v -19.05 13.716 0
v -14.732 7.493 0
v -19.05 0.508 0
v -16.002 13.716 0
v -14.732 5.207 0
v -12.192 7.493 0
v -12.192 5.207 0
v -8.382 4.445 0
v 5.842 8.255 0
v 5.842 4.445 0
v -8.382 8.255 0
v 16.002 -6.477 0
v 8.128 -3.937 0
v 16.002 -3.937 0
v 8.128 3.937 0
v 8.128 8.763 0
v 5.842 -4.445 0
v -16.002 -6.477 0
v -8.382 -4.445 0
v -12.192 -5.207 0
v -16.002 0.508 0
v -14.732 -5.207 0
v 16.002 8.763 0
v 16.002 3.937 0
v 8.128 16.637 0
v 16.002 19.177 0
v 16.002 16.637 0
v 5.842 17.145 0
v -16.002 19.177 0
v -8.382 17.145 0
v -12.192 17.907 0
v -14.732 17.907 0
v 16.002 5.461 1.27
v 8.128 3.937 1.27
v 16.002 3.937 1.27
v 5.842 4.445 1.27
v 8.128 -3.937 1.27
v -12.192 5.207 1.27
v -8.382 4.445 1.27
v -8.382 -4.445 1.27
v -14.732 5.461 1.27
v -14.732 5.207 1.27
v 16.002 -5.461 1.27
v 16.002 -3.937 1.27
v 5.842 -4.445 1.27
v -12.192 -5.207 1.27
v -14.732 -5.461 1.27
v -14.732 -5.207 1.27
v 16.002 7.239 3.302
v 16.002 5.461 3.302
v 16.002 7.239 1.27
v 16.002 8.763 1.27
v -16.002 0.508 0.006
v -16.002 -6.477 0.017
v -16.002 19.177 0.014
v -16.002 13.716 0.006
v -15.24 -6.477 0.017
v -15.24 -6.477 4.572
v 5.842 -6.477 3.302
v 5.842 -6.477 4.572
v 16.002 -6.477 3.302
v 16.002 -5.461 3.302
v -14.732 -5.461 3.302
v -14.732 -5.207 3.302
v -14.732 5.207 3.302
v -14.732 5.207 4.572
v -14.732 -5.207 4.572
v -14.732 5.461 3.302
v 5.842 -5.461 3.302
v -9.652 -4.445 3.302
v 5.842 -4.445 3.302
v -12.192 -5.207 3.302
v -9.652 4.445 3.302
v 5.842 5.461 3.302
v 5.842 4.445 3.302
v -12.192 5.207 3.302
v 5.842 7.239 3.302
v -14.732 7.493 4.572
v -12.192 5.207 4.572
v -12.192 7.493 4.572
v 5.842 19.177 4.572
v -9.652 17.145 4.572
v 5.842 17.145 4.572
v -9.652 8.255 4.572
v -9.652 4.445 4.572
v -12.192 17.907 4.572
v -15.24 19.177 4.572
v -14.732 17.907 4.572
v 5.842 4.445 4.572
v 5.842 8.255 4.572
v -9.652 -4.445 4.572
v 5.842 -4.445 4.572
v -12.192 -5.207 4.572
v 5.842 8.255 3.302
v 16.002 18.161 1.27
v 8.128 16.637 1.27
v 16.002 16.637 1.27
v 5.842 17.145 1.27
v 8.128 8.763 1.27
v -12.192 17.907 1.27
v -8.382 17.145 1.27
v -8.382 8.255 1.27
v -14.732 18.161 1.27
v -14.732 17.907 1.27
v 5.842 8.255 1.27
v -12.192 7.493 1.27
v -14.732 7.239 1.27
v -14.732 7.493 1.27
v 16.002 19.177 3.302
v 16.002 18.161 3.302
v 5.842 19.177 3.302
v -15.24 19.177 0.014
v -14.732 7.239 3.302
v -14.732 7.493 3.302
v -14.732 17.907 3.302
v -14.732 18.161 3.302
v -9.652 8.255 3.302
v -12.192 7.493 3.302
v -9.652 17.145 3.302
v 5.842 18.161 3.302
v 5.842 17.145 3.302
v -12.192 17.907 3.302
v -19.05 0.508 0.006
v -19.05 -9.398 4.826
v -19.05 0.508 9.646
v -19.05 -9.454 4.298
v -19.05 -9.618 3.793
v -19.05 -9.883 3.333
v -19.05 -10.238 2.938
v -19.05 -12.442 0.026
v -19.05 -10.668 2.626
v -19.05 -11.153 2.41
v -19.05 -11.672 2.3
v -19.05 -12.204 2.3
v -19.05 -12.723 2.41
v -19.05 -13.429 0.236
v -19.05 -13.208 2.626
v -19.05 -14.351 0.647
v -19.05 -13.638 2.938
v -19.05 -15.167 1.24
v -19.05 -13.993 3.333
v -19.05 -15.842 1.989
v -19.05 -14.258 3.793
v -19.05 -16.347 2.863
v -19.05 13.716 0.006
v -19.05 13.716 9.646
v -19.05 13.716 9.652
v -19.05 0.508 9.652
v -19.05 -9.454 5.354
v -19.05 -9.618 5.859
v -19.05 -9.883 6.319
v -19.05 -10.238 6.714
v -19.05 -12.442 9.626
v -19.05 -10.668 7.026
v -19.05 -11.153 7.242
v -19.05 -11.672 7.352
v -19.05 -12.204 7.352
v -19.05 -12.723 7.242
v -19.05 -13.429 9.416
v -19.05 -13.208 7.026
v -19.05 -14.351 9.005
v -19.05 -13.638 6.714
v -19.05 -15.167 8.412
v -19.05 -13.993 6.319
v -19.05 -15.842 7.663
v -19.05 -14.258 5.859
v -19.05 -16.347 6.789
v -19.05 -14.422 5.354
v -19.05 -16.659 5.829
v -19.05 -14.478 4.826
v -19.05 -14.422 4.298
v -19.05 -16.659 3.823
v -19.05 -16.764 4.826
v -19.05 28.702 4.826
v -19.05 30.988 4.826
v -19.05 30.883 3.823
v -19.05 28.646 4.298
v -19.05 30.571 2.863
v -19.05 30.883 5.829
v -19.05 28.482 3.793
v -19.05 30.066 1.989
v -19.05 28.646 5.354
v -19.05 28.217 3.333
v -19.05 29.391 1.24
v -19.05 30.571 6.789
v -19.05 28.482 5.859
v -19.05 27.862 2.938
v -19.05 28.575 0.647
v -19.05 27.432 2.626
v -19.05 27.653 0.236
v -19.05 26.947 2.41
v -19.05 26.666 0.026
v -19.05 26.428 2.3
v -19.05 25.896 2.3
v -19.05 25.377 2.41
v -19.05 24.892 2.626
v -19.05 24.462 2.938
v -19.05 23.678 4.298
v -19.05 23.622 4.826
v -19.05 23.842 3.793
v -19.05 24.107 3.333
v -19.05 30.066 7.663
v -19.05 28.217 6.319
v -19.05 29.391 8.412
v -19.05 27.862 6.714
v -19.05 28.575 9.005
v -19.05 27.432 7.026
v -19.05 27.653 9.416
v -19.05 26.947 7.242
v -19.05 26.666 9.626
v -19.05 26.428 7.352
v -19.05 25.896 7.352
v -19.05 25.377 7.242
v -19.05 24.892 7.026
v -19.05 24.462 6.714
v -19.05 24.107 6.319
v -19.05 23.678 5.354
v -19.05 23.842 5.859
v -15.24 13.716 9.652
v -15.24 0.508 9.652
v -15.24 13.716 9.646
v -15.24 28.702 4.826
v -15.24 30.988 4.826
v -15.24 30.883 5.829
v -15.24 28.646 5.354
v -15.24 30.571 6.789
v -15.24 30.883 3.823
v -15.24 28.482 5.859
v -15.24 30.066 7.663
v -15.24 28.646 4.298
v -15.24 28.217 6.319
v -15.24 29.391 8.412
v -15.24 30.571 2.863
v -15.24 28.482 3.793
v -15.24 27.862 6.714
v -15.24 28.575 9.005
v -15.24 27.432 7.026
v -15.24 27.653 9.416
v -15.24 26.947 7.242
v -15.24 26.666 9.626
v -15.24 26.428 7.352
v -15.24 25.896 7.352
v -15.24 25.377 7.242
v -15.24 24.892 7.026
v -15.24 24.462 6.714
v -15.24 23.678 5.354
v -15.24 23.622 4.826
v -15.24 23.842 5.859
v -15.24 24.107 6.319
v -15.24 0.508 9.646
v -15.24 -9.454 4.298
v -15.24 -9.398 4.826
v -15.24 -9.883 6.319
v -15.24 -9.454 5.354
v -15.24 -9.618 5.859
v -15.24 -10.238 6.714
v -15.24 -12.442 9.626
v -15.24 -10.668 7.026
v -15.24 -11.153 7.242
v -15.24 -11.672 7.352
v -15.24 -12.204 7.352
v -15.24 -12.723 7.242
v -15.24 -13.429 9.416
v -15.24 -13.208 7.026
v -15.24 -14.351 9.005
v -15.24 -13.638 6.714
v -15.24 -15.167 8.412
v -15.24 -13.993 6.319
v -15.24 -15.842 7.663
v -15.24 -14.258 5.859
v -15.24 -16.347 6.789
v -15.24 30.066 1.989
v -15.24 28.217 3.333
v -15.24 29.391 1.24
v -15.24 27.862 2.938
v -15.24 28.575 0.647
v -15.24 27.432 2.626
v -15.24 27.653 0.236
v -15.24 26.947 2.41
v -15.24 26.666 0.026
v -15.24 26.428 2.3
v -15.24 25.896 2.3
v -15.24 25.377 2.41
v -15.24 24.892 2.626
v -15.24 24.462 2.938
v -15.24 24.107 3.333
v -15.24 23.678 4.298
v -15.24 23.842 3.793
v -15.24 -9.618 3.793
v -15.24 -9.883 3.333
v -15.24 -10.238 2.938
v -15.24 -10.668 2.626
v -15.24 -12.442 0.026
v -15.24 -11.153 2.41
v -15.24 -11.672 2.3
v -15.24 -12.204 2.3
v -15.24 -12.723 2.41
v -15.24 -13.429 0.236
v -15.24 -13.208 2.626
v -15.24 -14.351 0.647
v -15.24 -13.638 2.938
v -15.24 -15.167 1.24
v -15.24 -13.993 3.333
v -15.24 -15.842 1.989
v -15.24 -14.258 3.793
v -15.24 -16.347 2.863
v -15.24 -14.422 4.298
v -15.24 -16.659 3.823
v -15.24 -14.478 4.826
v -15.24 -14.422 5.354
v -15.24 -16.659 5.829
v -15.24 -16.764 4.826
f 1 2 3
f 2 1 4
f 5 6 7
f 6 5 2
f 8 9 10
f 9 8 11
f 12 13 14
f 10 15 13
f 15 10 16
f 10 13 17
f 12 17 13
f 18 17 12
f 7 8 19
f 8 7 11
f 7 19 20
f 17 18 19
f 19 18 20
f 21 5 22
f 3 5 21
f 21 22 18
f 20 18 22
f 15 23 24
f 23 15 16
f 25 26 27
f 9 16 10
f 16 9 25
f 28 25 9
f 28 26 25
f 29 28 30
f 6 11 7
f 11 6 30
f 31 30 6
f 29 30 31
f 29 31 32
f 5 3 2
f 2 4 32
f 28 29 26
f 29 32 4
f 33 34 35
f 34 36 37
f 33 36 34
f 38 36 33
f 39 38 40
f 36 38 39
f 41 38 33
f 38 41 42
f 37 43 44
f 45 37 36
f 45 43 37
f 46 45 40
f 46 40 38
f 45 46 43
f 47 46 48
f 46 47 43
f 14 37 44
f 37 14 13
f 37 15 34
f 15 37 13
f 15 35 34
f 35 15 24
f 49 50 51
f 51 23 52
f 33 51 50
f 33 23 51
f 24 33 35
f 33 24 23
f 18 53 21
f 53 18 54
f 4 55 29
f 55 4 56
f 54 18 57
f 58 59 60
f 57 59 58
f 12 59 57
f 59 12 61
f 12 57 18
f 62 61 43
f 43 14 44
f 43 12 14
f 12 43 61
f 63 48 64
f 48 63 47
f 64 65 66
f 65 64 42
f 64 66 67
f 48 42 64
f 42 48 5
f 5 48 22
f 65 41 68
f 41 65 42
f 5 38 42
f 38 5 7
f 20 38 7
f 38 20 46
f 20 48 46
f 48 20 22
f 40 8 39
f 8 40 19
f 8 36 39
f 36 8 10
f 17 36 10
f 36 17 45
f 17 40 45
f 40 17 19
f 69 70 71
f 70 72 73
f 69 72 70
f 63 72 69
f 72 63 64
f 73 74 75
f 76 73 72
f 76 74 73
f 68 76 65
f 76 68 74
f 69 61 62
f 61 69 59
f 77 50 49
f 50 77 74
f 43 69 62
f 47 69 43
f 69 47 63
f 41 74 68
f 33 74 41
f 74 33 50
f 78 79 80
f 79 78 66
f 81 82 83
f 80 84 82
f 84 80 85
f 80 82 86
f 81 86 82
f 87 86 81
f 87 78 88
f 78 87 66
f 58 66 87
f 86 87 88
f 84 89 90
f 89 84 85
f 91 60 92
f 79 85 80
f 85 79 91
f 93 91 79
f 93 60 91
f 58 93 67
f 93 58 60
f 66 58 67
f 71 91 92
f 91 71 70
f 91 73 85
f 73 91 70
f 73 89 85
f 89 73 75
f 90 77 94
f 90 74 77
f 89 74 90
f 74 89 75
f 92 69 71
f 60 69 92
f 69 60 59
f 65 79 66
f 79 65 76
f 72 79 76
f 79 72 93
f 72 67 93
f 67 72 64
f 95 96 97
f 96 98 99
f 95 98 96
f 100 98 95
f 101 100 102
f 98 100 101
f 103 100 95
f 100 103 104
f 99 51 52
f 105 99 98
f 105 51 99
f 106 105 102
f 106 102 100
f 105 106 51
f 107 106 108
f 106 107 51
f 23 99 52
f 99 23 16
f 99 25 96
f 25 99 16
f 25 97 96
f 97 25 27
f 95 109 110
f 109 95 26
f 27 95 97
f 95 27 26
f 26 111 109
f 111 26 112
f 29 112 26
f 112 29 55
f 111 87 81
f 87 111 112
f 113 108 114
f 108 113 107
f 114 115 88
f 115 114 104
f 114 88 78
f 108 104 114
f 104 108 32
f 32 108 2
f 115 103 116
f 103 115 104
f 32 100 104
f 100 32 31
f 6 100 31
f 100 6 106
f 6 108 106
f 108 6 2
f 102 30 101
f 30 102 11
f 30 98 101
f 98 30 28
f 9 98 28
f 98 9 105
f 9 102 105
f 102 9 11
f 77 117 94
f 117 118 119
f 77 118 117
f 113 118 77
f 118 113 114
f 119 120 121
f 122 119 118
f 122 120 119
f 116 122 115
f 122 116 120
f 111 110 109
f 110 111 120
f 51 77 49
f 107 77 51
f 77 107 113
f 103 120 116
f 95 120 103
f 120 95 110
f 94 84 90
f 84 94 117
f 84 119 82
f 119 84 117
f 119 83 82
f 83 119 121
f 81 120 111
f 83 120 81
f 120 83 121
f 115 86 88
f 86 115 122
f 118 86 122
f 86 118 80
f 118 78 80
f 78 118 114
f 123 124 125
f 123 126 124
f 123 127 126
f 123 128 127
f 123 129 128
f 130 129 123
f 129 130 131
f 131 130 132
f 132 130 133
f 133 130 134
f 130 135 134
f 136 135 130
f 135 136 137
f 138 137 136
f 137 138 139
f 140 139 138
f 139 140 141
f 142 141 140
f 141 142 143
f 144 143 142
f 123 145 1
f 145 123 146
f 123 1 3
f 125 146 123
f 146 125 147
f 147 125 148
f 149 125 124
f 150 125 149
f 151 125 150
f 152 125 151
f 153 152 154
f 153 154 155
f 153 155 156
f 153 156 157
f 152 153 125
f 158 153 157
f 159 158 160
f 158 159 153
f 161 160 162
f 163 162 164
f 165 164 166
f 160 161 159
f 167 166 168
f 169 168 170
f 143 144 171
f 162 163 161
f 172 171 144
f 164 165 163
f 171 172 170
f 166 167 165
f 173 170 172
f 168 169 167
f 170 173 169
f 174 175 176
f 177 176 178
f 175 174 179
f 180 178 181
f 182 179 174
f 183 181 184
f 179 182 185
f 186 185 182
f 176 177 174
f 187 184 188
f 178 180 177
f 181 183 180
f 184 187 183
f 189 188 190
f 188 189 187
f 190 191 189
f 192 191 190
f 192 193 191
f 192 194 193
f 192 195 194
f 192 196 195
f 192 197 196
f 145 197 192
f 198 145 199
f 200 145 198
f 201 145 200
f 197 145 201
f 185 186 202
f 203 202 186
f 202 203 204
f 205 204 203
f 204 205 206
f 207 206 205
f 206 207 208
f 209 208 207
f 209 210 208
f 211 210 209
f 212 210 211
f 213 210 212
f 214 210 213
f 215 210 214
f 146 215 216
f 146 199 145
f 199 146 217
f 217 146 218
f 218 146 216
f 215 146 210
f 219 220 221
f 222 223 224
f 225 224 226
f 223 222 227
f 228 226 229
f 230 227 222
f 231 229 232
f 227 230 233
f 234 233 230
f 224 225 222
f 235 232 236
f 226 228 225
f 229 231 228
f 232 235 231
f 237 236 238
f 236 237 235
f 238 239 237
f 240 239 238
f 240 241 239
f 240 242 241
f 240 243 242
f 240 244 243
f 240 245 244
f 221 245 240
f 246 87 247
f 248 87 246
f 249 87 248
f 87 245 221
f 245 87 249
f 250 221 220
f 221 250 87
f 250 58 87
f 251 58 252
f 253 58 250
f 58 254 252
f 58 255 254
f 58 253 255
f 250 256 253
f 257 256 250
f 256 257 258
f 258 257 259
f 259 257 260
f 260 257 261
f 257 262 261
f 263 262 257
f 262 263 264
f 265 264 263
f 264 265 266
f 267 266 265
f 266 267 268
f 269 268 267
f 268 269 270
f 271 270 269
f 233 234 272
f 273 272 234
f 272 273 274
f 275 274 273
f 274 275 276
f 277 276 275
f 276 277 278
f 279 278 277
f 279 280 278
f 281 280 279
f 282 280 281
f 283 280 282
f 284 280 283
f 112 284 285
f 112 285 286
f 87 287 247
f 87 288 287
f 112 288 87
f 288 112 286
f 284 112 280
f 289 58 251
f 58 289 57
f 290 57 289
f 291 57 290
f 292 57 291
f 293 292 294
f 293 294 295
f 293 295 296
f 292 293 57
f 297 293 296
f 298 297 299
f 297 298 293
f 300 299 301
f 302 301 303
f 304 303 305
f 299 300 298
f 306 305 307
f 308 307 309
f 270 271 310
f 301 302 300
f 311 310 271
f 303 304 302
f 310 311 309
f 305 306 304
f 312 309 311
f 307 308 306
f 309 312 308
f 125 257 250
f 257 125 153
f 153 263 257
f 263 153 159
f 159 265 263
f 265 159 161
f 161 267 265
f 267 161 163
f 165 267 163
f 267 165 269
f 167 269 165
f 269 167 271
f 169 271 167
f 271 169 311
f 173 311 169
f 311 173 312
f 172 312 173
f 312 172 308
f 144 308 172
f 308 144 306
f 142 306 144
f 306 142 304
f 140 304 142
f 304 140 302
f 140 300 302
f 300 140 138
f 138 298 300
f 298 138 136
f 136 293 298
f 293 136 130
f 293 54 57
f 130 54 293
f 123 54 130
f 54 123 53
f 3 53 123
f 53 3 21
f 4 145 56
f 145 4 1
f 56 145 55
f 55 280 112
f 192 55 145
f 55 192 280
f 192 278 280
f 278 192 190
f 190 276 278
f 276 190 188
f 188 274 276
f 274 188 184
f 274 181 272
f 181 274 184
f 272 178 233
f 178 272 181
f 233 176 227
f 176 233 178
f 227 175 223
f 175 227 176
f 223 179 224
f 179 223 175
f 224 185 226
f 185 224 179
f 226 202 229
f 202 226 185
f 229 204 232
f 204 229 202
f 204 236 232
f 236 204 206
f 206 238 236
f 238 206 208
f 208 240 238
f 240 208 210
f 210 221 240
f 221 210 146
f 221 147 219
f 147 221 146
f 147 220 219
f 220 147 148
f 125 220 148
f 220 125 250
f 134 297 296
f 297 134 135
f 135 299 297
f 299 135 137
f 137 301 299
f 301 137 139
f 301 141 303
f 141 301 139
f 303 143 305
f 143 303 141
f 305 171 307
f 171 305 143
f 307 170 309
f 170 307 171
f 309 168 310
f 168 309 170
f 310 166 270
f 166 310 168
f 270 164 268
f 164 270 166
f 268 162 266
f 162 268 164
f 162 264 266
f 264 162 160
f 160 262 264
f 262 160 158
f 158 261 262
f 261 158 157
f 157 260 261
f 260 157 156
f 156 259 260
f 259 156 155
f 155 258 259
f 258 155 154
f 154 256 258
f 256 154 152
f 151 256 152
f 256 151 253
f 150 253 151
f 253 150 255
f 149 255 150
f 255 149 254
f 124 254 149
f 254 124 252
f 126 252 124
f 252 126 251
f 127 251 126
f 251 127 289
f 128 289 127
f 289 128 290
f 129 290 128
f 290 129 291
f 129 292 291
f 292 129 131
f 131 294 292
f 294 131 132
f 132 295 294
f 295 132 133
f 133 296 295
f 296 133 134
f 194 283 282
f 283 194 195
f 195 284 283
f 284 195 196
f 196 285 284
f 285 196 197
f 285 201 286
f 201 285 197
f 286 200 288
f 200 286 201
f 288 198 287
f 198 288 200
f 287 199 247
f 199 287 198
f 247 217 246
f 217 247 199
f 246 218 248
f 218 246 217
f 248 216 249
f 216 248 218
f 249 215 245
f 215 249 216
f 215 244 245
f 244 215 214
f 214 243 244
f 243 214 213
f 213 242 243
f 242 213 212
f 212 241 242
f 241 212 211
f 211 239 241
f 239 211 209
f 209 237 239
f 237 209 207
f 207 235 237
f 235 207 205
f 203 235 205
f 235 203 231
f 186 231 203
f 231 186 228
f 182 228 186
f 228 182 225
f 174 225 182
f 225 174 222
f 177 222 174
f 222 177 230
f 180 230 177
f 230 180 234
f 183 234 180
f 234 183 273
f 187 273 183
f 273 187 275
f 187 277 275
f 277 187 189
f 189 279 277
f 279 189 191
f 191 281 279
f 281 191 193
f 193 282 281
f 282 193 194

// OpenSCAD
ViewScale = [0.0254, 0.0254, 0.0254];

module vexmount1()
{
    difference() {
        hull() {
            circle(380/2);
            translate([820, 0, 0])
            square([380, 380], center=true);
        }
        circle(200/2);
    }
}


module vexmount()
{
    linear_extrude(150) {
        vexmount1();
        translate([1500, 0, 0])
        rotate([0, 180, 0])
        vexmount1();
    }
}

module mount()
{
    // bottom bit
    linear_extrude(50)
    difference() {
        square([1260, 510], center=true);
        translate([-50, 0, 0])
        square([560, 350], center=true);
        translate([-530, 0, 0])
        square([100, 410], center=true);
        translate([550, 0, 0])
        square([460, 310], center=true);
    }
    // middle bit
    translate([0, 0, 50])
    linear_extrude(80)
    difference() {
        square([1260, 510], center=true);
        translate([50, 0, 0])
        square([1260, 430], center=true);
    }
    // top bit
    translate([-200, 0, 130])
    linear_extrude(50)
    difference() {
        square([860, 510], center=true);
        translate([300, 0, 0])
        square([960, 350], center=true);
        translate([-330, 0, 0])
        square([100, 410], center=true);
    }
}

scale(ViewScale)
{
    mount();
    translate([0, 500, 0])
    mount();
    translate([-750, -470, 380/2])
    rotate([90, 0, 90])
    vexmount();
}
